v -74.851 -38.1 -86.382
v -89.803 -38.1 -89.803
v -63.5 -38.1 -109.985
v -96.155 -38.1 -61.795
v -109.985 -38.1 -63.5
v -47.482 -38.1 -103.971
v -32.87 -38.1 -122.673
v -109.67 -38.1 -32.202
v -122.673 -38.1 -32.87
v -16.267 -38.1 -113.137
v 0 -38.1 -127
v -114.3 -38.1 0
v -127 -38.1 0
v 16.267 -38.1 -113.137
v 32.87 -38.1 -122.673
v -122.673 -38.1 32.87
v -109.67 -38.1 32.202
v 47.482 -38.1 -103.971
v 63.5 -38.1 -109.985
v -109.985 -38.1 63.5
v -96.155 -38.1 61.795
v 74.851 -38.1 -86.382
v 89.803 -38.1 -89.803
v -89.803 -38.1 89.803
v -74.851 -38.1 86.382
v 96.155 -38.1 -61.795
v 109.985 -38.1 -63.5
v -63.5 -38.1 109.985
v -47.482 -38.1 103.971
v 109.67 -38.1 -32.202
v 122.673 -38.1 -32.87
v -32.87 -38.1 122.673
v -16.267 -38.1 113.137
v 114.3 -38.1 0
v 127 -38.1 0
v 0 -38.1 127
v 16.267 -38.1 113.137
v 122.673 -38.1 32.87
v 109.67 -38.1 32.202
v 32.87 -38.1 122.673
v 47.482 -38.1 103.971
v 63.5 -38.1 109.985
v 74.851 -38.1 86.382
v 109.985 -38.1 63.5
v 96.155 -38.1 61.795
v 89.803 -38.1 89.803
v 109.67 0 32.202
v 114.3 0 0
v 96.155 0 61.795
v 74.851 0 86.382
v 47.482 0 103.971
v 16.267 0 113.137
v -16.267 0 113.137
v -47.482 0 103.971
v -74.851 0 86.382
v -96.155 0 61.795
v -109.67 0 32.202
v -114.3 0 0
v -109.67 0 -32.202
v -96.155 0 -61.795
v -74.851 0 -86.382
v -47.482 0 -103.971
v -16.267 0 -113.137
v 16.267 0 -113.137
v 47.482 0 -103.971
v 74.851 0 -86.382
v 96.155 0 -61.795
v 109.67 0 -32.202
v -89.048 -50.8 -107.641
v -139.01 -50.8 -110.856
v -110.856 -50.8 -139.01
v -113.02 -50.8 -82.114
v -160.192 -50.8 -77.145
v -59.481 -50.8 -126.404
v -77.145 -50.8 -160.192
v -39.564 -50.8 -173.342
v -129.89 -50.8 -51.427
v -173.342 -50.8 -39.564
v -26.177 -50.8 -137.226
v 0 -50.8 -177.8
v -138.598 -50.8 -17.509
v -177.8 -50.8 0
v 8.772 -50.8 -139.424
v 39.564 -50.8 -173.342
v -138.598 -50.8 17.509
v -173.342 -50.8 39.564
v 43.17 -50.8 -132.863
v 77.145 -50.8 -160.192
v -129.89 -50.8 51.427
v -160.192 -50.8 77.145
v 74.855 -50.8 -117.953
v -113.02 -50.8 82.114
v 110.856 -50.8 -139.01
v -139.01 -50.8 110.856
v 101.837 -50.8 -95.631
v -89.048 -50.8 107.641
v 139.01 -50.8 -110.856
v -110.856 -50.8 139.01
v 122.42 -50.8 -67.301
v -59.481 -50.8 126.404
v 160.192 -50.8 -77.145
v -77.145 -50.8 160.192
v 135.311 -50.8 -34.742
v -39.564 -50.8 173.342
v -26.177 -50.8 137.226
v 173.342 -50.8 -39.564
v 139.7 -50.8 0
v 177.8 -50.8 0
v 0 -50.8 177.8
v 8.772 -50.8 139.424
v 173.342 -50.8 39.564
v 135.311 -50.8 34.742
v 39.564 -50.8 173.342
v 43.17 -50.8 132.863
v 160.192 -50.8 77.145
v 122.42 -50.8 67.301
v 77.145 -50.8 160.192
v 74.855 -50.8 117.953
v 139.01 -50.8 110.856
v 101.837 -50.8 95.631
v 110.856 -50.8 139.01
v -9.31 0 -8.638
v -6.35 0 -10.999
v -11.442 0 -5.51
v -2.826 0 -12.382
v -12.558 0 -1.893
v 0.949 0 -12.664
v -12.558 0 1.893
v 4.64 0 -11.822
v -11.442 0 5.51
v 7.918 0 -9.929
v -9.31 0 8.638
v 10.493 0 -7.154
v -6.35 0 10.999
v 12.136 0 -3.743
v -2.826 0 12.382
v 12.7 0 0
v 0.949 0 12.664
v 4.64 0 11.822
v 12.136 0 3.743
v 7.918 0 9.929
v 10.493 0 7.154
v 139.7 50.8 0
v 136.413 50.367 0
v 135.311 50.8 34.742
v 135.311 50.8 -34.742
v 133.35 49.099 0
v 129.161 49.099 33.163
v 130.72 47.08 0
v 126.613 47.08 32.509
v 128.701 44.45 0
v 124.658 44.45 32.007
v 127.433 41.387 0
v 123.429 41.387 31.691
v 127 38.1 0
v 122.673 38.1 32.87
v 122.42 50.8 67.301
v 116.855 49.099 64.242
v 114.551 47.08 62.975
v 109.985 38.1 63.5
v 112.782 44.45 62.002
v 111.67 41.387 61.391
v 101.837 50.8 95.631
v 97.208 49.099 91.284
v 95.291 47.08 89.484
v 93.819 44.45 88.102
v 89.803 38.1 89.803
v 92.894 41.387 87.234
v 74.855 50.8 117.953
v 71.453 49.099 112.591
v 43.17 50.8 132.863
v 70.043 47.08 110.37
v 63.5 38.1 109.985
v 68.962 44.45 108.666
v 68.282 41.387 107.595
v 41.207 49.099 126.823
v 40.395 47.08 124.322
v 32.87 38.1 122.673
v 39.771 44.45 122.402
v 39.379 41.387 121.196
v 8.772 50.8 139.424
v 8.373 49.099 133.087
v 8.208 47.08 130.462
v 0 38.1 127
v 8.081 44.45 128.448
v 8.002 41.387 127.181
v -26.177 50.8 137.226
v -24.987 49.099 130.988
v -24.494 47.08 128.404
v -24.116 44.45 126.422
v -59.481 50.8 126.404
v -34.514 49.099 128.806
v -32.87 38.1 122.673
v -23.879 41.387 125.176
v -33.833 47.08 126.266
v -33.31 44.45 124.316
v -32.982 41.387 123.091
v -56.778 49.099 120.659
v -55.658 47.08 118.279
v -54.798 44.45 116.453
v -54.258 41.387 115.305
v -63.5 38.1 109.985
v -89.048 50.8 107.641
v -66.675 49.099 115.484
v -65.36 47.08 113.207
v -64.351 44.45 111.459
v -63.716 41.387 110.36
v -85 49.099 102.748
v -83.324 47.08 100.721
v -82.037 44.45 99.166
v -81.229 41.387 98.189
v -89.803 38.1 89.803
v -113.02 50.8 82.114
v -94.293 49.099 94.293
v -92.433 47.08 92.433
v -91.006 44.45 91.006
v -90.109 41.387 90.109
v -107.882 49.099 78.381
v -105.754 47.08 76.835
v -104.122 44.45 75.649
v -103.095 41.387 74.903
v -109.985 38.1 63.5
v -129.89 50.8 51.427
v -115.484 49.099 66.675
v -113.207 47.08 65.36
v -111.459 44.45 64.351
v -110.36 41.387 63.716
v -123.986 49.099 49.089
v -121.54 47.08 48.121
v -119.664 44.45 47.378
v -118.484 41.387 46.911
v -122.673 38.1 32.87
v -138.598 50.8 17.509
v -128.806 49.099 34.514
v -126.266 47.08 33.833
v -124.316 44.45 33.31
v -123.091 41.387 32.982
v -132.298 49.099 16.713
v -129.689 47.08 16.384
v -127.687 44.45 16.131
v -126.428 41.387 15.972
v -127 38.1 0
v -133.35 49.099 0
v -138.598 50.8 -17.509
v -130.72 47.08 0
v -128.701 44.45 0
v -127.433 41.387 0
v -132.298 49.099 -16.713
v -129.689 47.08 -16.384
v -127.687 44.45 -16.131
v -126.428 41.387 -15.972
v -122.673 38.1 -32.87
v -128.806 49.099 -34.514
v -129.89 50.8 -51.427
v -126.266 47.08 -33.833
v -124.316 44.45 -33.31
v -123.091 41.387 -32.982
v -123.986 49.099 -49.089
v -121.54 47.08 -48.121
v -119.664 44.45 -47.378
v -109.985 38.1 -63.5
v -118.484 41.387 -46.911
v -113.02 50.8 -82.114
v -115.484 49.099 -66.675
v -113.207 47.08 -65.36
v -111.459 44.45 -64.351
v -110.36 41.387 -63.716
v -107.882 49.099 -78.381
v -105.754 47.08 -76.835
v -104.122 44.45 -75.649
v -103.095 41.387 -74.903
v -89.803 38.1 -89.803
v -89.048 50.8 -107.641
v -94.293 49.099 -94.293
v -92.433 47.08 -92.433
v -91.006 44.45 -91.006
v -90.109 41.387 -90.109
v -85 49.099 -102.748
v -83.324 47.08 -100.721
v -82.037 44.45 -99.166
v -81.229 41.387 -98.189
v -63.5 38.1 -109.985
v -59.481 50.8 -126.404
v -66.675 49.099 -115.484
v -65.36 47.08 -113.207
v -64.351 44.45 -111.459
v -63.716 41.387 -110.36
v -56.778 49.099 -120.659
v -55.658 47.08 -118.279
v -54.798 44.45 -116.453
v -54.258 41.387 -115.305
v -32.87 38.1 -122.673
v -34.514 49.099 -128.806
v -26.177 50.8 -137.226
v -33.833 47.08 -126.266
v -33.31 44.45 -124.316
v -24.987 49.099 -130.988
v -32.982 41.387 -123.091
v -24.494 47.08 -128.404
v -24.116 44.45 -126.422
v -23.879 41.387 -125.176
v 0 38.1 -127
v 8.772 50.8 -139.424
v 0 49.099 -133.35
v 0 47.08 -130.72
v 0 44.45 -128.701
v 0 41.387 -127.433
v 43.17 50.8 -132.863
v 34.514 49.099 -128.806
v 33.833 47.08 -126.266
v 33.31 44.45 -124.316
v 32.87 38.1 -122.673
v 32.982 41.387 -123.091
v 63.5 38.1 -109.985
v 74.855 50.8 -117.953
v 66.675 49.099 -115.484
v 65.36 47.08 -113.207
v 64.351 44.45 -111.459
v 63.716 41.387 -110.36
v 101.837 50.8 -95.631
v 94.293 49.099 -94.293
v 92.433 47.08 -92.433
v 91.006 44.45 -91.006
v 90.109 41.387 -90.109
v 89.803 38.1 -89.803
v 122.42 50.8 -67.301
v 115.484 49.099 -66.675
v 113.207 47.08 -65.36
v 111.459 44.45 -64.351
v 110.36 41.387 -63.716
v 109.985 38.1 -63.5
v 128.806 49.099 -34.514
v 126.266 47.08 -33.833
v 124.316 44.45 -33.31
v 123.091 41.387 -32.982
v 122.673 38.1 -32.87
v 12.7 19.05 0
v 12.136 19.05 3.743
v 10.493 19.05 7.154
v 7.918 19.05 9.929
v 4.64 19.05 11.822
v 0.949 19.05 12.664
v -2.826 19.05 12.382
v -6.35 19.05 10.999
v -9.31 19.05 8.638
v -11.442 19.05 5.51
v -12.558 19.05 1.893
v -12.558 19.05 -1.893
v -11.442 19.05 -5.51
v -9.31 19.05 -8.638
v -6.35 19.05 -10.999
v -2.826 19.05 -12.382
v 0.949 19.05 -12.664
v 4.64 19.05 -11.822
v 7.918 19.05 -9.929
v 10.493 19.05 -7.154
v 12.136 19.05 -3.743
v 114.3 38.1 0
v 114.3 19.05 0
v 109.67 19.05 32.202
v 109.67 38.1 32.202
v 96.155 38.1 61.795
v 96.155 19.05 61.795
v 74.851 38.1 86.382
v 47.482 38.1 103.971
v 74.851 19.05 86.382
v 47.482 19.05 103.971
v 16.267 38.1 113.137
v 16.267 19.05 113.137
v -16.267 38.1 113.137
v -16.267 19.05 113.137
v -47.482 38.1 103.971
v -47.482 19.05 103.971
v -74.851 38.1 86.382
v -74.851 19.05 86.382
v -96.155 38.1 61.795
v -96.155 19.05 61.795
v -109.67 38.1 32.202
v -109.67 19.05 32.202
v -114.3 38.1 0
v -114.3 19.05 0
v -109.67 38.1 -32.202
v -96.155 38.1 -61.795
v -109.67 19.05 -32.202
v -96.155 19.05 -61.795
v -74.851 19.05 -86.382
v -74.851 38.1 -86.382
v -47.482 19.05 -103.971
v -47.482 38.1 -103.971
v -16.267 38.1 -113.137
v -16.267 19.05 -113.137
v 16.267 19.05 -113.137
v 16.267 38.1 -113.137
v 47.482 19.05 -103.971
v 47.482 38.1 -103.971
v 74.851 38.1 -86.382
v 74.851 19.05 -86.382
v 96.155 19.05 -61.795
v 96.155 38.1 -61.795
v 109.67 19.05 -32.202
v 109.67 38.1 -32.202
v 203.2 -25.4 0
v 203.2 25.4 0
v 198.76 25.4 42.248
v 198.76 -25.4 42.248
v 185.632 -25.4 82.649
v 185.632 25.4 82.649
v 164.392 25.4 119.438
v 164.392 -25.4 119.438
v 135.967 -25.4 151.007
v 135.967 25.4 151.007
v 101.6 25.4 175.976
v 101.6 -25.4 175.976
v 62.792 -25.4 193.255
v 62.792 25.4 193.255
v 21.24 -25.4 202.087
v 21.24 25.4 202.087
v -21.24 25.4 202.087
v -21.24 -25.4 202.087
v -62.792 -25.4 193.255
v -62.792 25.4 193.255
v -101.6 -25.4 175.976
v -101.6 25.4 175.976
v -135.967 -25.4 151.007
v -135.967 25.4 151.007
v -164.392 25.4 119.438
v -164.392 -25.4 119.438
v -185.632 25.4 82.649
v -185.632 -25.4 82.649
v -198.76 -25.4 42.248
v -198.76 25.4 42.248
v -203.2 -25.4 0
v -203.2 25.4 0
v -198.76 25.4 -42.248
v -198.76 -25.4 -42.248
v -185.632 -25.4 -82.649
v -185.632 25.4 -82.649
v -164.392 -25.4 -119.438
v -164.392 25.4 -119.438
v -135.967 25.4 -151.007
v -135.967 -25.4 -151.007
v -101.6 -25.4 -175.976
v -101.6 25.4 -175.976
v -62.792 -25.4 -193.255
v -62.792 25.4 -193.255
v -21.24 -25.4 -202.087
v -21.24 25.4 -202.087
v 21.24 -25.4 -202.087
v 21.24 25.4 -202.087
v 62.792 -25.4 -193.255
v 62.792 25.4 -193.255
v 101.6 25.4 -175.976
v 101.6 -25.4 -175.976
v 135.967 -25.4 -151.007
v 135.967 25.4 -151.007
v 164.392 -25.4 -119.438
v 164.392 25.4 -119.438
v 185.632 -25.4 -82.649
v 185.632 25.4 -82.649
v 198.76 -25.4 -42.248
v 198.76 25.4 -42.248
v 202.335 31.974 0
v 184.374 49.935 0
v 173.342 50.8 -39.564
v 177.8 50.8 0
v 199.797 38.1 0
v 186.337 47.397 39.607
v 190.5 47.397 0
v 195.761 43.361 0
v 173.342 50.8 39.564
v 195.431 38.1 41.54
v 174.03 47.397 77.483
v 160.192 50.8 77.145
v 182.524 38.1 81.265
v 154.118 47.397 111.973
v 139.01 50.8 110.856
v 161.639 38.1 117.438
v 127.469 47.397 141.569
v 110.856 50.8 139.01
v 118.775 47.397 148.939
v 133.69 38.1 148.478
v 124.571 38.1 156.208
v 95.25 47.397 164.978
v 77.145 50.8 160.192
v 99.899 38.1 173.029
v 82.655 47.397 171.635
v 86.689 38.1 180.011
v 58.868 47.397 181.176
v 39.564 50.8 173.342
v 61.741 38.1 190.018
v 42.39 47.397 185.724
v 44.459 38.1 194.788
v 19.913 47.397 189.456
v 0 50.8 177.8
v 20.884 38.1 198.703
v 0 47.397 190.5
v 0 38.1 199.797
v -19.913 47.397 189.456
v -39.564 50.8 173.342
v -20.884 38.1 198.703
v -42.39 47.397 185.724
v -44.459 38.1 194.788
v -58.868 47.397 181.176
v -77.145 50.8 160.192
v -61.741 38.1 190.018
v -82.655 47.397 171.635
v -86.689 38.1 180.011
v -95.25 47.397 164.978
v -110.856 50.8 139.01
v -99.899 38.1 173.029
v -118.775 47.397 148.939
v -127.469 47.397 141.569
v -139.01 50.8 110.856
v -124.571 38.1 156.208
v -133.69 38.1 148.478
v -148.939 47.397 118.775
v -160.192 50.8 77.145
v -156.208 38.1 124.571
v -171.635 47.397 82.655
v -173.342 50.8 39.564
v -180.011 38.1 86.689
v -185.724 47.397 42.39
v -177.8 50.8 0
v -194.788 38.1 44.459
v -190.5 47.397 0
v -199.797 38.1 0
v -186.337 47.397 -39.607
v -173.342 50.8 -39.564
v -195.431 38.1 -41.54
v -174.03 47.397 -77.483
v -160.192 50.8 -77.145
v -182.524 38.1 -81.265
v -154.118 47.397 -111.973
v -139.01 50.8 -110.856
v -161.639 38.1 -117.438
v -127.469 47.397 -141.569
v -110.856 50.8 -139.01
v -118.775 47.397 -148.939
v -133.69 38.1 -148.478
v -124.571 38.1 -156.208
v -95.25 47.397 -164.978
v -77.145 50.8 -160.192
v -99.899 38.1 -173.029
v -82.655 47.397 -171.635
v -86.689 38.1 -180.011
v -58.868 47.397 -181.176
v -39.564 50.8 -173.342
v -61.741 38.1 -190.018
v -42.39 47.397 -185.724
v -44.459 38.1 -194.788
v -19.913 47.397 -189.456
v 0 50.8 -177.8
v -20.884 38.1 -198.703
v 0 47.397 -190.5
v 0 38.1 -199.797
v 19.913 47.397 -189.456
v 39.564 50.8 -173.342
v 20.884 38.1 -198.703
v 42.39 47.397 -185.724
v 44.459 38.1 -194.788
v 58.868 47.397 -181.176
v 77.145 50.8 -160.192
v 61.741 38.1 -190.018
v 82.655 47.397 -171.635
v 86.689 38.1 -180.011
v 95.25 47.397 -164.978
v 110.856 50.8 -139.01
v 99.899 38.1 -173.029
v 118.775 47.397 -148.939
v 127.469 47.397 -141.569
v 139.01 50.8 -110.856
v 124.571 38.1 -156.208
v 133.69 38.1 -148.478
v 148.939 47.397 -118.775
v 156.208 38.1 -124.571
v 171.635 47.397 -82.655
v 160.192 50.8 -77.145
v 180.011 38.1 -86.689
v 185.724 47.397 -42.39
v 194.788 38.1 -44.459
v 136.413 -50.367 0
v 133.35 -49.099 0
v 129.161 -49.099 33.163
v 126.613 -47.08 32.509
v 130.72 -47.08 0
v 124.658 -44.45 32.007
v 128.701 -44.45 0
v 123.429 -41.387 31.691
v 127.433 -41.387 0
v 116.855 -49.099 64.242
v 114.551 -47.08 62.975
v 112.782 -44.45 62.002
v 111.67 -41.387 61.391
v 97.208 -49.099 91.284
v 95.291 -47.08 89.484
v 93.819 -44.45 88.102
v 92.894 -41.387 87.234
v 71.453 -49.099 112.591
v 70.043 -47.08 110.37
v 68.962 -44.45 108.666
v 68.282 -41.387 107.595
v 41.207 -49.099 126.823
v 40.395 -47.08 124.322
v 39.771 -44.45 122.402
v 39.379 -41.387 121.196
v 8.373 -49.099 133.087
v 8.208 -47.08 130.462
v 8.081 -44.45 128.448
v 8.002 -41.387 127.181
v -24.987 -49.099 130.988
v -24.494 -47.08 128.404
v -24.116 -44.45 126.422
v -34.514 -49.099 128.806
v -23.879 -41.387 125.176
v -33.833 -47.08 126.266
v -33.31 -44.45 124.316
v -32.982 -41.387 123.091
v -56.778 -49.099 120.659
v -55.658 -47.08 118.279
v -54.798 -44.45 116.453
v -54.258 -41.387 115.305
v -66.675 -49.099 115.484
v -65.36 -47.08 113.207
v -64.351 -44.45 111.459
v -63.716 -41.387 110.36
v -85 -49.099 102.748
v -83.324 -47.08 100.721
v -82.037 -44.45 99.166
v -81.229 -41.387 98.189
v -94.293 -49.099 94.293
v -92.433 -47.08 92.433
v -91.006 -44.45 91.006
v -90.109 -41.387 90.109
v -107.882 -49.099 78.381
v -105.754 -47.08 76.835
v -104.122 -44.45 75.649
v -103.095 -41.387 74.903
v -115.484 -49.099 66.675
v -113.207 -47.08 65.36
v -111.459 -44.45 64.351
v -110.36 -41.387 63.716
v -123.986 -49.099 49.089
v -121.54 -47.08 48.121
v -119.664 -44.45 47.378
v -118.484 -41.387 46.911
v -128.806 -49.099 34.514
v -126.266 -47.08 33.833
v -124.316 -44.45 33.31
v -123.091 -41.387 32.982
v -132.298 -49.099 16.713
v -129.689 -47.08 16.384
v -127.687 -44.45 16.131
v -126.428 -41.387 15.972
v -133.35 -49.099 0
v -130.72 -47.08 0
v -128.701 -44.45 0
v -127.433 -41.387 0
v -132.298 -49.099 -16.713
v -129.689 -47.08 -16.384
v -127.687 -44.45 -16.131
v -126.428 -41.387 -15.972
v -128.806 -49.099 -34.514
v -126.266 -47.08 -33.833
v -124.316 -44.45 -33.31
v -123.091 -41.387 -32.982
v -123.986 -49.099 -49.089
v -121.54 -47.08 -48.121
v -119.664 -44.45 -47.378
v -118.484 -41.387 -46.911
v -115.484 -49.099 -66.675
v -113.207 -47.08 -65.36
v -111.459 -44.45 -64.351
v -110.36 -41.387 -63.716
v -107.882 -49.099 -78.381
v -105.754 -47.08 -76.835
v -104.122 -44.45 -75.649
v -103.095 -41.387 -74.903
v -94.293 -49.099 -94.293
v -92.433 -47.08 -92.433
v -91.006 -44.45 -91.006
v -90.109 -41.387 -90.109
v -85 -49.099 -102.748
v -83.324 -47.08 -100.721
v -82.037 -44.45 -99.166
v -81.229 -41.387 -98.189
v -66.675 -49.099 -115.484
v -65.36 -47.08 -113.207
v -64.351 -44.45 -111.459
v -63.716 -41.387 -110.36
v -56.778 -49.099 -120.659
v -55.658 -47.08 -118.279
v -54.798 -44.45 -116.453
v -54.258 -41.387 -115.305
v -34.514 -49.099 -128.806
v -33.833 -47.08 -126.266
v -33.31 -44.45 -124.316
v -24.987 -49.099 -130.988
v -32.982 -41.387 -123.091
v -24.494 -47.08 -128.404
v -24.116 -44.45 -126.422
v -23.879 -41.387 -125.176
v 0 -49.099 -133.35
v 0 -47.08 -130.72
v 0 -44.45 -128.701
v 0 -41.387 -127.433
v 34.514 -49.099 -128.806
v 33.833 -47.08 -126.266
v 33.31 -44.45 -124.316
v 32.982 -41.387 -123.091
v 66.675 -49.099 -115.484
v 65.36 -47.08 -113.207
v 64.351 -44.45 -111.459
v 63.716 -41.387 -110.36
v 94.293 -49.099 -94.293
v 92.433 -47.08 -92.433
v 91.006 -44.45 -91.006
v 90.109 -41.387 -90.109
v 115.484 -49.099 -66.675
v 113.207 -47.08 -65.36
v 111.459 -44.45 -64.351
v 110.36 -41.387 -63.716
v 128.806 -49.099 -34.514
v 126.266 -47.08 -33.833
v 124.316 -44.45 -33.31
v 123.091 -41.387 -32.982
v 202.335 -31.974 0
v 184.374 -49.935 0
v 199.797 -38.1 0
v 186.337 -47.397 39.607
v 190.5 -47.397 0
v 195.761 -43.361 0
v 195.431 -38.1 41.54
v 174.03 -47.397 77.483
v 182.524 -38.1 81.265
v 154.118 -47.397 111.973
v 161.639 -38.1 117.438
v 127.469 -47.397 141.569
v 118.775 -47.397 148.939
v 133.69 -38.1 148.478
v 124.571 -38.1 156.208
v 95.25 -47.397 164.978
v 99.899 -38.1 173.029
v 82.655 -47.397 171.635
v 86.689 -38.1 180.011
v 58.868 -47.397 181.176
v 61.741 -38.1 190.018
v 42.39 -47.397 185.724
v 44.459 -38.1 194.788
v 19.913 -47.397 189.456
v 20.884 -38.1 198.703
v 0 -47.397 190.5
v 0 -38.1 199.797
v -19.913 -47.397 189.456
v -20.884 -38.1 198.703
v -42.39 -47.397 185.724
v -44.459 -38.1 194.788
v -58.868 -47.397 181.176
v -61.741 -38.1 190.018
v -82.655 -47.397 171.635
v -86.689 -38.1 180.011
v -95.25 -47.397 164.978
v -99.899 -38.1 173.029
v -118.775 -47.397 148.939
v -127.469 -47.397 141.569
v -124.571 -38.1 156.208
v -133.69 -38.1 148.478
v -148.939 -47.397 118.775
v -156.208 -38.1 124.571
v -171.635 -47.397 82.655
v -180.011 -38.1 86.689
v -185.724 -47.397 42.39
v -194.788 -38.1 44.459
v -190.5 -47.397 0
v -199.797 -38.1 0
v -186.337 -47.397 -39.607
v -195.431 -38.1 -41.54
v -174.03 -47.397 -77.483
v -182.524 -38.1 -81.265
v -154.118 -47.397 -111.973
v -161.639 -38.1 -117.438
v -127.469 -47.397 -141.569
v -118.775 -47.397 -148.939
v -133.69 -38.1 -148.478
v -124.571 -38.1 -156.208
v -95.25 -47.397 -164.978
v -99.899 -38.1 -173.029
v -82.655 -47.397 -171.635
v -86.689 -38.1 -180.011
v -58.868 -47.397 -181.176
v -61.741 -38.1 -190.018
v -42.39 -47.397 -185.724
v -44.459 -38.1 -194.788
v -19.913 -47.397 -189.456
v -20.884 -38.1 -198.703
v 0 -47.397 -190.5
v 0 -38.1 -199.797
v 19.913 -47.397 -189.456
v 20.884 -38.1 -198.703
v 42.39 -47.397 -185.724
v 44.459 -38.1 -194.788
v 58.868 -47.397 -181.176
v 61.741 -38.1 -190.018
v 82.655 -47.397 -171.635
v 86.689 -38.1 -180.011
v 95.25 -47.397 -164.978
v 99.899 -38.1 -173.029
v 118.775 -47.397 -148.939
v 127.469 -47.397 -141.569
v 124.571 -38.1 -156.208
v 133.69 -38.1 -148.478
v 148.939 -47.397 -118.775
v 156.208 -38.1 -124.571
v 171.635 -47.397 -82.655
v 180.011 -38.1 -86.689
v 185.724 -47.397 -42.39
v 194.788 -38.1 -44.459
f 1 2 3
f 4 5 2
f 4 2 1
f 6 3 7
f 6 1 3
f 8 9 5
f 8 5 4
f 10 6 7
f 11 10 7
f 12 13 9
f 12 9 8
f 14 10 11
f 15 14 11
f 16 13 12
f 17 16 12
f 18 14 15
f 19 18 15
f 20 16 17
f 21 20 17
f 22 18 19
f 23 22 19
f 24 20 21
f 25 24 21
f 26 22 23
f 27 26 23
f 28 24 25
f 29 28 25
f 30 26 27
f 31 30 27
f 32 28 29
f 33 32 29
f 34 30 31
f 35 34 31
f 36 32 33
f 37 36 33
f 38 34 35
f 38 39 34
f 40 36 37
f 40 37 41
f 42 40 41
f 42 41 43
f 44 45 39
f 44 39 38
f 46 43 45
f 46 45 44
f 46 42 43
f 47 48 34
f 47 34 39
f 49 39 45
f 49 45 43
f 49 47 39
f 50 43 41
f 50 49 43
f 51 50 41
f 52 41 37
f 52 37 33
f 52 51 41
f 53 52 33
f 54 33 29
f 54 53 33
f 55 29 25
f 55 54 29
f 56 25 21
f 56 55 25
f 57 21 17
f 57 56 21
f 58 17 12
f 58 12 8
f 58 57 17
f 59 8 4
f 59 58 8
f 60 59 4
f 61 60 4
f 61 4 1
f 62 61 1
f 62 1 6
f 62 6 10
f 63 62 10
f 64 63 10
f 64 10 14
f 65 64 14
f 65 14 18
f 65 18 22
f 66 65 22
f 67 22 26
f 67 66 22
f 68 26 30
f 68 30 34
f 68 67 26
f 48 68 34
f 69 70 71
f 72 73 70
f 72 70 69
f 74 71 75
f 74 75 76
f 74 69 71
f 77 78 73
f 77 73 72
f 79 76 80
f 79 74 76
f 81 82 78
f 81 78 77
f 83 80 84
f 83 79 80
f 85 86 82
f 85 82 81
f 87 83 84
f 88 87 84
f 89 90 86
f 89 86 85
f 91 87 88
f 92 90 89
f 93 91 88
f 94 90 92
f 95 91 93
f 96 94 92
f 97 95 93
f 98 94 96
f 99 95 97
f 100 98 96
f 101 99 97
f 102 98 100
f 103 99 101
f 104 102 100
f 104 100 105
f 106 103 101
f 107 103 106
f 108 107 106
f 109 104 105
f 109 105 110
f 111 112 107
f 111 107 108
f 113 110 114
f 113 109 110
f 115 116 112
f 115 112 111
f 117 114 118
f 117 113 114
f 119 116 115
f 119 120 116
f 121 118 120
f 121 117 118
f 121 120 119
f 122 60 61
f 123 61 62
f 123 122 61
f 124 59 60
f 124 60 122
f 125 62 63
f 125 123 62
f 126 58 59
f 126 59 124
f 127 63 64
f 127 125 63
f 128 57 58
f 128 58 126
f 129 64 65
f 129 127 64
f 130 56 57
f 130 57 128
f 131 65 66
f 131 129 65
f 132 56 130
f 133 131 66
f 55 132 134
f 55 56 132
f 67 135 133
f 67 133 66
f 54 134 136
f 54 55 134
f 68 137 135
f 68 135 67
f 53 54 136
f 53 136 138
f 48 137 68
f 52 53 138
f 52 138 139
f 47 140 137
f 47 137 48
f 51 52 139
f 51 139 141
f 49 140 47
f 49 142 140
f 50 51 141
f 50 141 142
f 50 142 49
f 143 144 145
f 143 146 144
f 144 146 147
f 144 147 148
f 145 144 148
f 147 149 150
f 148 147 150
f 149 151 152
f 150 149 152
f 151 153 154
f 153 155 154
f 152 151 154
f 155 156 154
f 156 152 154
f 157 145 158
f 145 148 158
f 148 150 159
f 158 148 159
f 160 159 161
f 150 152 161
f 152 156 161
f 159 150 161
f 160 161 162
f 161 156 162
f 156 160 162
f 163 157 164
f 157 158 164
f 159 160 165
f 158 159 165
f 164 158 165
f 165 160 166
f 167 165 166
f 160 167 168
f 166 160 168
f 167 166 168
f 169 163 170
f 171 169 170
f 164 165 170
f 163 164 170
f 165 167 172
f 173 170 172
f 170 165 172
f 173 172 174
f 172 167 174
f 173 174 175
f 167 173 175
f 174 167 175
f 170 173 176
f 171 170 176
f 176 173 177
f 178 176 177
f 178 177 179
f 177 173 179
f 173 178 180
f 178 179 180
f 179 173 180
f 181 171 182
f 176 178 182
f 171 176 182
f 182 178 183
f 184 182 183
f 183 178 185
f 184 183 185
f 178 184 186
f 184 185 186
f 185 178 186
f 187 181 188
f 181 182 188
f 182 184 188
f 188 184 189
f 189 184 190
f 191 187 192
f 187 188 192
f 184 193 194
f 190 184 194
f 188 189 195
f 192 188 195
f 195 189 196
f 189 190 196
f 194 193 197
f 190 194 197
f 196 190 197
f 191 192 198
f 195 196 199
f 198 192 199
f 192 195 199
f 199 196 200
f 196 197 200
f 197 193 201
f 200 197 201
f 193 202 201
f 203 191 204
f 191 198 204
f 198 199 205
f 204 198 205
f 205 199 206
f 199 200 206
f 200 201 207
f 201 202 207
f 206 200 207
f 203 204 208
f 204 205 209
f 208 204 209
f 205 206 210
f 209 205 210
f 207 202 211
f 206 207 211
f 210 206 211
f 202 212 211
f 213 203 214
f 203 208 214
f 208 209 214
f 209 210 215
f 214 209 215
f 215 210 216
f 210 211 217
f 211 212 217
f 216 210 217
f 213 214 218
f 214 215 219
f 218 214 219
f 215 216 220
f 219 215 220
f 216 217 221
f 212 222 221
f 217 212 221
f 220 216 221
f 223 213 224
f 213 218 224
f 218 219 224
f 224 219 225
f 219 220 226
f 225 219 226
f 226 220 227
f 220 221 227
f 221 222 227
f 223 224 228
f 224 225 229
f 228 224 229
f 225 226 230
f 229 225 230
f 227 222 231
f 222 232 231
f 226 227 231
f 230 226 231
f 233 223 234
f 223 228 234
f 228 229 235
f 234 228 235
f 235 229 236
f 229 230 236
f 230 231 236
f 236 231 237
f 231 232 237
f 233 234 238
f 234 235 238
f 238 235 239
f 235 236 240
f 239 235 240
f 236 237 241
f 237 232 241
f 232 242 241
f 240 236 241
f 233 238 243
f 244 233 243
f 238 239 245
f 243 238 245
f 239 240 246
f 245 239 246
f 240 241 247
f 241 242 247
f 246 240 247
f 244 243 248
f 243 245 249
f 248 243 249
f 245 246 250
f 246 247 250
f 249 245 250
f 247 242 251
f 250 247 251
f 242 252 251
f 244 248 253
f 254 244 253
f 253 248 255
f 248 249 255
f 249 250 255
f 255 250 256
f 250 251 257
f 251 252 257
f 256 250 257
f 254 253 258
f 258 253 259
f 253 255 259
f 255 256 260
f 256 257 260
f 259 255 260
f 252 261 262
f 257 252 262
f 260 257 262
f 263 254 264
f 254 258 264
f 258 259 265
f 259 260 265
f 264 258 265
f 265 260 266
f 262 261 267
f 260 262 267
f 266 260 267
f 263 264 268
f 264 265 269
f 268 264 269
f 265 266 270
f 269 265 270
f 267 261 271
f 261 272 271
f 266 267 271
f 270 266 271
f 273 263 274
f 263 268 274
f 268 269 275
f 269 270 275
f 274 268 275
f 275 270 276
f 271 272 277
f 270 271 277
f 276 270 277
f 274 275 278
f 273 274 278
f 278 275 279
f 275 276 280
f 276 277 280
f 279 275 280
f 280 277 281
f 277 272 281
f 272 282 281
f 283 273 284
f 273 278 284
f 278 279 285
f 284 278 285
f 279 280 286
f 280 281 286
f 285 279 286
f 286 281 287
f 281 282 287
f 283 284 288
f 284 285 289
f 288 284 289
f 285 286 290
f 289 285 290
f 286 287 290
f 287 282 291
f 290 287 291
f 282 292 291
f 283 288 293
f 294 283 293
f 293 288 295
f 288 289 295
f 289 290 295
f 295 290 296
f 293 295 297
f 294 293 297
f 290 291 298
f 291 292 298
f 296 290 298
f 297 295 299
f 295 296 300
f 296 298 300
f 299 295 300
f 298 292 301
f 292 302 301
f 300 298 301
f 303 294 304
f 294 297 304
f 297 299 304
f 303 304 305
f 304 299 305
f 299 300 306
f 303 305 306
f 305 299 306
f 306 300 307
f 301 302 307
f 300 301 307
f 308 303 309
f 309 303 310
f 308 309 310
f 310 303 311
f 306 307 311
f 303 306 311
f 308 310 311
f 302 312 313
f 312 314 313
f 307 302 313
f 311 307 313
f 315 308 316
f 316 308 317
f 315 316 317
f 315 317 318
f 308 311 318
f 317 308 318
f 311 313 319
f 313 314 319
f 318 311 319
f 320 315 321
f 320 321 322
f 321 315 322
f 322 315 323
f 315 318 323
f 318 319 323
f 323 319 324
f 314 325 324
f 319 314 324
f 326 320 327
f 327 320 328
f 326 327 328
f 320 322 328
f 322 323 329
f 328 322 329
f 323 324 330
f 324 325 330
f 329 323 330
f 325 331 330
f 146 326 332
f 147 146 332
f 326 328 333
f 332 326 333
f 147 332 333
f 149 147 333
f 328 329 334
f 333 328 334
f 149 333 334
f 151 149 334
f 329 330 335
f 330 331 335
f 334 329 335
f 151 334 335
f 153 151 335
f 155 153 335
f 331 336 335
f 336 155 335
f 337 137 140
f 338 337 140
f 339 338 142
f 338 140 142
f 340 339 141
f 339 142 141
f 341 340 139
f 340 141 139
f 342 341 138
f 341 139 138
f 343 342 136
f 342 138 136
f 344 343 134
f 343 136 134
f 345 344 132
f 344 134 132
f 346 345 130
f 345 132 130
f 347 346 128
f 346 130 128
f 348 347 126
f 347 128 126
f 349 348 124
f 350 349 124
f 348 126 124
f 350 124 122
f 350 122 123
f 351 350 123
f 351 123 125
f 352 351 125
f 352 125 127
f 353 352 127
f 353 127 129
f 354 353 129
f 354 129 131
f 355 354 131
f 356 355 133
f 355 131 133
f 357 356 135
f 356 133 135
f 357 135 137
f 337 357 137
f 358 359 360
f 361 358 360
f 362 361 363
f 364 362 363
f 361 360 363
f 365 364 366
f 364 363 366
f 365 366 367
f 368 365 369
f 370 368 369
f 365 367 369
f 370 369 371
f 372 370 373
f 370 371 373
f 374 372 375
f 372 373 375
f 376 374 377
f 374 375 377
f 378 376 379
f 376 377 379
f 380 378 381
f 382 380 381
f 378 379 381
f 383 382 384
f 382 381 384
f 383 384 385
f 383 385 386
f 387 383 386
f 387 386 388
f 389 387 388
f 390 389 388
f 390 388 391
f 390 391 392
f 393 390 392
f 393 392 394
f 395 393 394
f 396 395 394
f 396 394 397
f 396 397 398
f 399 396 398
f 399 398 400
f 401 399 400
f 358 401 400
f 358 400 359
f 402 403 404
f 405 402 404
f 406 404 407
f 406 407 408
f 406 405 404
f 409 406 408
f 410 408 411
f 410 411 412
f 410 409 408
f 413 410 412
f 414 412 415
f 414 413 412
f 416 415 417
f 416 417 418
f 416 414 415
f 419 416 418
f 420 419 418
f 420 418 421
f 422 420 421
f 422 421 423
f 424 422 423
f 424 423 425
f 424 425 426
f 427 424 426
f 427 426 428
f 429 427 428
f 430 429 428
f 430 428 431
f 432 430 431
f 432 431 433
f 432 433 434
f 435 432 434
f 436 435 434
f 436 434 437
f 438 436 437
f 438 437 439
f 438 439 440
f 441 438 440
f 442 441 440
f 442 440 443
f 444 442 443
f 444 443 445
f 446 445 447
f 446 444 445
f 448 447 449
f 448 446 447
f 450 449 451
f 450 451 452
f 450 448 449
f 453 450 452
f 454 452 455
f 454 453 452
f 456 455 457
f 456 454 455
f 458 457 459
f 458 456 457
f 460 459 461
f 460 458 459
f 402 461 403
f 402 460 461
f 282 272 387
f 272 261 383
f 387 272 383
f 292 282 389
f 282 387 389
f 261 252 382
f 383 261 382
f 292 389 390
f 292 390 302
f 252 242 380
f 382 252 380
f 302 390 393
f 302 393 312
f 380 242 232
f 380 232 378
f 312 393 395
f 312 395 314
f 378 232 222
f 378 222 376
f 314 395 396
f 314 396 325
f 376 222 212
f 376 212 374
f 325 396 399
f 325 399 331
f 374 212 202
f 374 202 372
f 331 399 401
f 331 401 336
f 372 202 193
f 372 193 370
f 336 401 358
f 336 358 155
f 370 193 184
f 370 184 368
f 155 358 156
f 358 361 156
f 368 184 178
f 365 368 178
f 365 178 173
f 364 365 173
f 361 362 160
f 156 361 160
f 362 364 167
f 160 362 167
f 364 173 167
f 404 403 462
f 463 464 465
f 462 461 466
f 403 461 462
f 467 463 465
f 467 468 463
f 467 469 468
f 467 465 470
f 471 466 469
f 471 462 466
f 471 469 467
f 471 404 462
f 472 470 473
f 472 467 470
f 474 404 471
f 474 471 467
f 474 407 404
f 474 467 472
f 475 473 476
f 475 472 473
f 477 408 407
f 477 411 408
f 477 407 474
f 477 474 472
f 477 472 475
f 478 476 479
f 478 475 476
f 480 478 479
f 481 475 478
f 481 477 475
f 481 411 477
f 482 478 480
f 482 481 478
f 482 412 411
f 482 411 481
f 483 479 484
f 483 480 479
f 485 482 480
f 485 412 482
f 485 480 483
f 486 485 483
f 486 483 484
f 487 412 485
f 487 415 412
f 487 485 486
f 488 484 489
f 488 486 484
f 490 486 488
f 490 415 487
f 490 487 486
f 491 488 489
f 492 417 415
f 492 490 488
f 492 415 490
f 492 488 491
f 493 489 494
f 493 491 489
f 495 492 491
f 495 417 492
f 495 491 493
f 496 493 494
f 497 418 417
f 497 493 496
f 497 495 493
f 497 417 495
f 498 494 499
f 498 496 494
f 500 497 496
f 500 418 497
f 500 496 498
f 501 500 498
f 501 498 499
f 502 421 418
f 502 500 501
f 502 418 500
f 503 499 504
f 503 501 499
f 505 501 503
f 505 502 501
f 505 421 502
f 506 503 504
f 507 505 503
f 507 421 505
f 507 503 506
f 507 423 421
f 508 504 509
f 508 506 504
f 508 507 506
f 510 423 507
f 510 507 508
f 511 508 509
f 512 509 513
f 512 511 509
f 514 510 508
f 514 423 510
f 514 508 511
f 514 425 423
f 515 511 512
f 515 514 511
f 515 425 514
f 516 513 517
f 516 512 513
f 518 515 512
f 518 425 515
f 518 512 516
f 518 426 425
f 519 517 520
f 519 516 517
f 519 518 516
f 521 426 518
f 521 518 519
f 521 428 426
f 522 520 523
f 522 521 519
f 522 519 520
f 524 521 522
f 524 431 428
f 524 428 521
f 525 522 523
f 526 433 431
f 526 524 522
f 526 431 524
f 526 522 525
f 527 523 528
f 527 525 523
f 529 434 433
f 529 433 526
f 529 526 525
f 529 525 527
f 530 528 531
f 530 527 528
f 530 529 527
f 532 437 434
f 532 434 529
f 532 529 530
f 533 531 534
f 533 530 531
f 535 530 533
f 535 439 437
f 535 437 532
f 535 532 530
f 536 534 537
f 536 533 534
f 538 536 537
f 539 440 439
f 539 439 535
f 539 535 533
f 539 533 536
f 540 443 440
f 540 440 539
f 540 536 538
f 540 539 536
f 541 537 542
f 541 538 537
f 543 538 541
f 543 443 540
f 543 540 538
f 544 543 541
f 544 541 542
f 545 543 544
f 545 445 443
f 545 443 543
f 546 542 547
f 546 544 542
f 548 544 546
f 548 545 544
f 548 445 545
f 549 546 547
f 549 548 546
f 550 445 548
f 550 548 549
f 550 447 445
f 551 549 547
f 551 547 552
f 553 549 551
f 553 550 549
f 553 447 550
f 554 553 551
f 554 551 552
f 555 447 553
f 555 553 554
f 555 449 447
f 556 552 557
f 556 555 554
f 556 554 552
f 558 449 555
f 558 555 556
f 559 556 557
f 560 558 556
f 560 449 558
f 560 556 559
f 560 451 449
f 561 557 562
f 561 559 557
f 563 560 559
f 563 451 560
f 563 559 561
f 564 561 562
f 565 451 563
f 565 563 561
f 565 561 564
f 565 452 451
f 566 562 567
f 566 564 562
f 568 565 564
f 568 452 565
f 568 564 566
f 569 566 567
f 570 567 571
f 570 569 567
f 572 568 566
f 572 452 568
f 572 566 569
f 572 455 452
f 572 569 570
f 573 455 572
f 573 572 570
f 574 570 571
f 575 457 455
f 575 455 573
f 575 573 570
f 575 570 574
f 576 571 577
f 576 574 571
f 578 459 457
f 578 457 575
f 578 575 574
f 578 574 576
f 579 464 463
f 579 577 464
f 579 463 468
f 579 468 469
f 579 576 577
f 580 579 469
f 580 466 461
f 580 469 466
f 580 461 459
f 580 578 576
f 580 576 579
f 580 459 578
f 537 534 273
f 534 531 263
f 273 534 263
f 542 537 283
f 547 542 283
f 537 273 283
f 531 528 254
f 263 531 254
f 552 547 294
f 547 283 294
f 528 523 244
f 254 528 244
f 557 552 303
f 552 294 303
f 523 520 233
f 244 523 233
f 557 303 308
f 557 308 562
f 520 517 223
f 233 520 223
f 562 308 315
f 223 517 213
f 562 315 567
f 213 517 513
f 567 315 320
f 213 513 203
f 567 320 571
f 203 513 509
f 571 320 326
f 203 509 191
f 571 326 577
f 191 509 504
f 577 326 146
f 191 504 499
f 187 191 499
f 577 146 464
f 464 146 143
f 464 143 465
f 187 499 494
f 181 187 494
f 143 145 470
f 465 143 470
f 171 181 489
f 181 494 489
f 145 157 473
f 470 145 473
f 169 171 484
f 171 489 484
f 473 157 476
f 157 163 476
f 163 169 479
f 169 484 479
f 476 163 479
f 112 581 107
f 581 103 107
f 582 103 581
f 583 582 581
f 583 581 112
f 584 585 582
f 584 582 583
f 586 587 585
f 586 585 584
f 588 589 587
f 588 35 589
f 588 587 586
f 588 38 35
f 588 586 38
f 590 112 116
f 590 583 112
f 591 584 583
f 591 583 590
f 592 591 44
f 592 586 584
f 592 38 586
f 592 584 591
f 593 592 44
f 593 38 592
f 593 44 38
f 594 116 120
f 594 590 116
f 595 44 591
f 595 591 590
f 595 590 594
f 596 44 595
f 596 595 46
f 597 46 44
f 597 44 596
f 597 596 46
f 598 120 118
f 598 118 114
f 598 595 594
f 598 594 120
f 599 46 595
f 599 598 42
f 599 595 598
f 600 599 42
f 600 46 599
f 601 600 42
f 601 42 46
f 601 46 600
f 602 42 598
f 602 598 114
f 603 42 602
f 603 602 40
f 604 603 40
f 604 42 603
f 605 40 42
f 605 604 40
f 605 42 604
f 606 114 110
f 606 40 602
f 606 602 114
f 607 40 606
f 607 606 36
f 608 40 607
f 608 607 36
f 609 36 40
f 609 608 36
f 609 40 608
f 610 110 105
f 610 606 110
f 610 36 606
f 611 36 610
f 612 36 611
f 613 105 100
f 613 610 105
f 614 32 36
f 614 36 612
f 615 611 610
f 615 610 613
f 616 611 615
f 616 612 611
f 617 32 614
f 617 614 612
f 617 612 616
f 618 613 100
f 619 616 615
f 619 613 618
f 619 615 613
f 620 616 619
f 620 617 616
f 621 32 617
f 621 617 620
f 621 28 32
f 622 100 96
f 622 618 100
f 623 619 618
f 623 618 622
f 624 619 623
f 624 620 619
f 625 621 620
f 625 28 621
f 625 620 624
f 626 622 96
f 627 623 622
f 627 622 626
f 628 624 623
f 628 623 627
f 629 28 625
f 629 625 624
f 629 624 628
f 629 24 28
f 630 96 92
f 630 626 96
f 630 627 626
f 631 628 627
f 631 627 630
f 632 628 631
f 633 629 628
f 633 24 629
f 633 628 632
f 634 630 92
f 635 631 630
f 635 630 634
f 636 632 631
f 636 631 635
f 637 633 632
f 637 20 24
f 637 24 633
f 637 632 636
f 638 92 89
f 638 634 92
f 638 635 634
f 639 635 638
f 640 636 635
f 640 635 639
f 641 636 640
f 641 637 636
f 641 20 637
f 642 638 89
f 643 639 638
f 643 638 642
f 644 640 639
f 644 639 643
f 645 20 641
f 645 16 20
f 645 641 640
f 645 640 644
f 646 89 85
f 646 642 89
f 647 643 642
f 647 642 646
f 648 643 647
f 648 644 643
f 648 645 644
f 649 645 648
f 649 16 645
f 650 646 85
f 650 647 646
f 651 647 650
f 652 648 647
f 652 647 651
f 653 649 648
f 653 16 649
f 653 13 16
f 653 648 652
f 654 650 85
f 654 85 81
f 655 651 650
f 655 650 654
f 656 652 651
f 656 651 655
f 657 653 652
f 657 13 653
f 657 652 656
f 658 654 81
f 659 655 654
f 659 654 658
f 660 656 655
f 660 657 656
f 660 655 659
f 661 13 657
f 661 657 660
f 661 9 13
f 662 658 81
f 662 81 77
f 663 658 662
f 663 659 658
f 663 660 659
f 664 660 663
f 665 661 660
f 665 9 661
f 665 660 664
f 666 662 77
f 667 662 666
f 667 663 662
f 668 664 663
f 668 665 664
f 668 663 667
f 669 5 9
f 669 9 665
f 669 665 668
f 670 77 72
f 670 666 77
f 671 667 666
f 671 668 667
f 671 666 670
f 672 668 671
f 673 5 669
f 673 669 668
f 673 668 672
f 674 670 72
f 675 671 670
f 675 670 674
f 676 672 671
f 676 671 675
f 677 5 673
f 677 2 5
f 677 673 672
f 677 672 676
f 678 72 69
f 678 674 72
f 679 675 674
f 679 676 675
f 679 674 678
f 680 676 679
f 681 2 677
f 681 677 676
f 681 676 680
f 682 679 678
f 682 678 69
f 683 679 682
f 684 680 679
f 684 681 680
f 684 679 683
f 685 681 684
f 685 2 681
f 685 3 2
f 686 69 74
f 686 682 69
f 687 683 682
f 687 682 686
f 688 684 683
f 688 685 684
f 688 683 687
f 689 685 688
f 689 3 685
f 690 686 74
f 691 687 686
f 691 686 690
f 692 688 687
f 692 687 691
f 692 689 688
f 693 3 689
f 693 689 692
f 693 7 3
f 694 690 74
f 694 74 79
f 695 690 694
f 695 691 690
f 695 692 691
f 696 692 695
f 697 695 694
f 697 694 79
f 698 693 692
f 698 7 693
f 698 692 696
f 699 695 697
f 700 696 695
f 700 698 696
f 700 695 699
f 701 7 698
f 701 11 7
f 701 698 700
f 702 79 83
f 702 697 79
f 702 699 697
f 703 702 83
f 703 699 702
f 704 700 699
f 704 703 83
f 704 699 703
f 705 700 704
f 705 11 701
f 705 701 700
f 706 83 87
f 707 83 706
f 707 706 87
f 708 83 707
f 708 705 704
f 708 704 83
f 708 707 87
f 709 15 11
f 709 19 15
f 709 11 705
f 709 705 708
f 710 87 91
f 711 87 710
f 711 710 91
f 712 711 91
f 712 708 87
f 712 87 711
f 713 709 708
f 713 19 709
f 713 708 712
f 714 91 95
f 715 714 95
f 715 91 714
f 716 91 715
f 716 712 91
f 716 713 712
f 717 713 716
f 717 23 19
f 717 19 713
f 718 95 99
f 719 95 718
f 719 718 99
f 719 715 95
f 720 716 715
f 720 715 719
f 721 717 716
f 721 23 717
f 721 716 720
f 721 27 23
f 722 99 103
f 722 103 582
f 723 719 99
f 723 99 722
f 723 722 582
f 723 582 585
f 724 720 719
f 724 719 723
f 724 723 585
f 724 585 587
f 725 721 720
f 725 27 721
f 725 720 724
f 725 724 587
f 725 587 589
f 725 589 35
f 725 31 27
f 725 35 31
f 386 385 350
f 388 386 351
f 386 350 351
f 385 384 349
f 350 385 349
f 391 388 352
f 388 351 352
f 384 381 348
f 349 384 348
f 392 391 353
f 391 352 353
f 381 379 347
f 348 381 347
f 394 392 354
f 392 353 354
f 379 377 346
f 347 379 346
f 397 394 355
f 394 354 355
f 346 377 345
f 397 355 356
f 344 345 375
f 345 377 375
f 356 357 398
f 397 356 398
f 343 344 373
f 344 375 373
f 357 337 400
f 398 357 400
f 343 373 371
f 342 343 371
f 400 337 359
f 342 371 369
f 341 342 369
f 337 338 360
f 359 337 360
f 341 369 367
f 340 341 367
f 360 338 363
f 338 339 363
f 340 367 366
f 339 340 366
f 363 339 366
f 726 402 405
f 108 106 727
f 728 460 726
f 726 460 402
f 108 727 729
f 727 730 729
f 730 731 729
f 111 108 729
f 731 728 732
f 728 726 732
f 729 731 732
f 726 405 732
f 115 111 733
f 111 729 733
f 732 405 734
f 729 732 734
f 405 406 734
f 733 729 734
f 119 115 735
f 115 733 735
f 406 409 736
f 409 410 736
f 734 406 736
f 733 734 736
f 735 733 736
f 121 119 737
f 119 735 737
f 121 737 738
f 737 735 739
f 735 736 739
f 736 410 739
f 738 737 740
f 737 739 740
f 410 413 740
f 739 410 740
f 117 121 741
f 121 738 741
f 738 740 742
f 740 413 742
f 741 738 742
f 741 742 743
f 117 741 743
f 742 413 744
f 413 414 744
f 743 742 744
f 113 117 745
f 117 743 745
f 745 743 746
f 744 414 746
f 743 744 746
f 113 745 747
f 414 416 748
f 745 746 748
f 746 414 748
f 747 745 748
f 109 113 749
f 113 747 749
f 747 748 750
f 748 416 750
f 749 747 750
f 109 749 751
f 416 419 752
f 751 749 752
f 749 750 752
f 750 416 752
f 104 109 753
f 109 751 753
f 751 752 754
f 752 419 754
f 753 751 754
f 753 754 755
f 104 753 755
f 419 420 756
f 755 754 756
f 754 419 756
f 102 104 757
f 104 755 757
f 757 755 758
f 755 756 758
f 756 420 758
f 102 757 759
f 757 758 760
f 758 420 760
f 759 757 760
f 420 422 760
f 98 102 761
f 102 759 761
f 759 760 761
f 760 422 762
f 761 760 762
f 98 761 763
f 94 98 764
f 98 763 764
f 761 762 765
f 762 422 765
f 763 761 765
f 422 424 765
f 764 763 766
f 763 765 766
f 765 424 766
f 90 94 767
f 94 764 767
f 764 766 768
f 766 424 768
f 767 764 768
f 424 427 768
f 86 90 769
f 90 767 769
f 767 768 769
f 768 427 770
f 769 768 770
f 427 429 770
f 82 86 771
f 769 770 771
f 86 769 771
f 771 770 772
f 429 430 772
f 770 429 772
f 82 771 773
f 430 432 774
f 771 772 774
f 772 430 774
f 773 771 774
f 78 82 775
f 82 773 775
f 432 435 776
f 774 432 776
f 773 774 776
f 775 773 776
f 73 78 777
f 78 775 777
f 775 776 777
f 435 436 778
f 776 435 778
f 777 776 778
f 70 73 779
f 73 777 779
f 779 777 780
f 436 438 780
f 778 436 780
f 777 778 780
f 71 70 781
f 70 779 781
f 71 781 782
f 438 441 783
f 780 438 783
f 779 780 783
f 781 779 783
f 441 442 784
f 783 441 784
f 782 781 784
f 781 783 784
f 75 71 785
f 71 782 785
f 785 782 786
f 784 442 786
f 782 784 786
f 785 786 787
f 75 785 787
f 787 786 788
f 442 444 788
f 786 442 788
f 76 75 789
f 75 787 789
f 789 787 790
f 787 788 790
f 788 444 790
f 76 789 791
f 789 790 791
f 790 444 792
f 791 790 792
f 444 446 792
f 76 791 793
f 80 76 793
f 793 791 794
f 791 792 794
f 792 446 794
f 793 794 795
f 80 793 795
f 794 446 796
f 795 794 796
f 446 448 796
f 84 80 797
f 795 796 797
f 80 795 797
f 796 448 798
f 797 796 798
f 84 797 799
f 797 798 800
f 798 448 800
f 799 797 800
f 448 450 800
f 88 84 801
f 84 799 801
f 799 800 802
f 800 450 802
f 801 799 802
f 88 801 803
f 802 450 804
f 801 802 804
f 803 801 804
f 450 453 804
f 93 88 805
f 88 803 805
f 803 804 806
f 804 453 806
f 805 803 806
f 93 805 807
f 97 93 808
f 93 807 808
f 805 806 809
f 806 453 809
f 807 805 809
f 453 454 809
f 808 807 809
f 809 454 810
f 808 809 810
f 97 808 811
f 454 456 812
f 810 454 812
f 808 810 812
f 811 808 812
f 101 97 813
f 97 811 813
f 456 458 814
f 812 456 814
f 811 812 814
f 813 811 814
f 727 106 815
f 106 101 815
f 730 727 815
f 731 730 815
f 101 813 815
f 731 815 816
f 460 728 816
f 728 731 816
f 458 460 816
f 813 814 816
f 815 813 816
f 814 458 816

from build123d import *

# Parameters (mm, degrees)
F0_R     = 203.2
F0_R_2   = 127
F1_DEPTH = 50.8
F2_DEPTH = 50.8
F0_R_3   = 114.3
F3_DEPTH = 38.1
F4_DEPTH = 38.1
F5_R     = 25.4
F6_R     = 12.69999
F0_R_4   = 12.7
F7_DEPTH = 19.05


# Not quite as in the source:
# - a fillet or chamfer is up to 0.001 mm smaller than in the source, because OpenCascade refuses the exact size


with BuildPart() as f1:
    # F0 (on Front) → F1 (new body)
    with BuildSketch(Plane.XZ):
        Circle(F0_R)
        Circle(F0_R_2, mode=Mode.SUBTRACT)
    extrude(amount=F1_DEPTH)

    # F0 (on Front) → F2 (join)
    with BuildSketch(Plane.XZ):
        Circle(F0_R)
        Circle(F0_R_2, mode=Mode.SUBTRACT)
    extrude(amount=-F2_DEPTH)

    # F0 (on Front) → F3 (join)
    with BuildSketch(Plane.XZ):
        Circle(F0_R_2)
        Circle(F0_R_3, mode=Mode.SUBTRACT)
    extrude(amount=F3_DEPTH)

    # F0 (on Front) → F4 (join)
    with BuildSketch(Plane.XZ):
        Circle(F0_R_2)
        Circle(F0_R_3, mode=Mode.SUBTRACT)
    extrude(amount=-F4_DEPTH)

    # F5
    f5_edges = [f1.edges().sort_by_distance(p)[0] for p in [
        (-203.2, -50.8, 0),
        (-203.2, 50.8, 0),
    ]]
    fillet(f5_edges, radius=F5_R)

    # F6 (radius 12.7 in the source; OpenCascade refuses exactly that, so slightly less here)
    f6_edges = [f1.edges().sort_by_distance(p)[0] for p in [
        (-127, -50.8, 0),
        (-127, 50.8, 0),
    ]]
    fillet(f6_edges, radius=F6_R)

    # F0 (on Front) → F7 (join)
    with BuildSketch(Plane.XZ):
        Circle(F0_R_3)
        Circle(F0_R_4, mode=Mode.SUBTRACT)
    extrude(amount=-F7_DEPTH)


solid = f1.part
